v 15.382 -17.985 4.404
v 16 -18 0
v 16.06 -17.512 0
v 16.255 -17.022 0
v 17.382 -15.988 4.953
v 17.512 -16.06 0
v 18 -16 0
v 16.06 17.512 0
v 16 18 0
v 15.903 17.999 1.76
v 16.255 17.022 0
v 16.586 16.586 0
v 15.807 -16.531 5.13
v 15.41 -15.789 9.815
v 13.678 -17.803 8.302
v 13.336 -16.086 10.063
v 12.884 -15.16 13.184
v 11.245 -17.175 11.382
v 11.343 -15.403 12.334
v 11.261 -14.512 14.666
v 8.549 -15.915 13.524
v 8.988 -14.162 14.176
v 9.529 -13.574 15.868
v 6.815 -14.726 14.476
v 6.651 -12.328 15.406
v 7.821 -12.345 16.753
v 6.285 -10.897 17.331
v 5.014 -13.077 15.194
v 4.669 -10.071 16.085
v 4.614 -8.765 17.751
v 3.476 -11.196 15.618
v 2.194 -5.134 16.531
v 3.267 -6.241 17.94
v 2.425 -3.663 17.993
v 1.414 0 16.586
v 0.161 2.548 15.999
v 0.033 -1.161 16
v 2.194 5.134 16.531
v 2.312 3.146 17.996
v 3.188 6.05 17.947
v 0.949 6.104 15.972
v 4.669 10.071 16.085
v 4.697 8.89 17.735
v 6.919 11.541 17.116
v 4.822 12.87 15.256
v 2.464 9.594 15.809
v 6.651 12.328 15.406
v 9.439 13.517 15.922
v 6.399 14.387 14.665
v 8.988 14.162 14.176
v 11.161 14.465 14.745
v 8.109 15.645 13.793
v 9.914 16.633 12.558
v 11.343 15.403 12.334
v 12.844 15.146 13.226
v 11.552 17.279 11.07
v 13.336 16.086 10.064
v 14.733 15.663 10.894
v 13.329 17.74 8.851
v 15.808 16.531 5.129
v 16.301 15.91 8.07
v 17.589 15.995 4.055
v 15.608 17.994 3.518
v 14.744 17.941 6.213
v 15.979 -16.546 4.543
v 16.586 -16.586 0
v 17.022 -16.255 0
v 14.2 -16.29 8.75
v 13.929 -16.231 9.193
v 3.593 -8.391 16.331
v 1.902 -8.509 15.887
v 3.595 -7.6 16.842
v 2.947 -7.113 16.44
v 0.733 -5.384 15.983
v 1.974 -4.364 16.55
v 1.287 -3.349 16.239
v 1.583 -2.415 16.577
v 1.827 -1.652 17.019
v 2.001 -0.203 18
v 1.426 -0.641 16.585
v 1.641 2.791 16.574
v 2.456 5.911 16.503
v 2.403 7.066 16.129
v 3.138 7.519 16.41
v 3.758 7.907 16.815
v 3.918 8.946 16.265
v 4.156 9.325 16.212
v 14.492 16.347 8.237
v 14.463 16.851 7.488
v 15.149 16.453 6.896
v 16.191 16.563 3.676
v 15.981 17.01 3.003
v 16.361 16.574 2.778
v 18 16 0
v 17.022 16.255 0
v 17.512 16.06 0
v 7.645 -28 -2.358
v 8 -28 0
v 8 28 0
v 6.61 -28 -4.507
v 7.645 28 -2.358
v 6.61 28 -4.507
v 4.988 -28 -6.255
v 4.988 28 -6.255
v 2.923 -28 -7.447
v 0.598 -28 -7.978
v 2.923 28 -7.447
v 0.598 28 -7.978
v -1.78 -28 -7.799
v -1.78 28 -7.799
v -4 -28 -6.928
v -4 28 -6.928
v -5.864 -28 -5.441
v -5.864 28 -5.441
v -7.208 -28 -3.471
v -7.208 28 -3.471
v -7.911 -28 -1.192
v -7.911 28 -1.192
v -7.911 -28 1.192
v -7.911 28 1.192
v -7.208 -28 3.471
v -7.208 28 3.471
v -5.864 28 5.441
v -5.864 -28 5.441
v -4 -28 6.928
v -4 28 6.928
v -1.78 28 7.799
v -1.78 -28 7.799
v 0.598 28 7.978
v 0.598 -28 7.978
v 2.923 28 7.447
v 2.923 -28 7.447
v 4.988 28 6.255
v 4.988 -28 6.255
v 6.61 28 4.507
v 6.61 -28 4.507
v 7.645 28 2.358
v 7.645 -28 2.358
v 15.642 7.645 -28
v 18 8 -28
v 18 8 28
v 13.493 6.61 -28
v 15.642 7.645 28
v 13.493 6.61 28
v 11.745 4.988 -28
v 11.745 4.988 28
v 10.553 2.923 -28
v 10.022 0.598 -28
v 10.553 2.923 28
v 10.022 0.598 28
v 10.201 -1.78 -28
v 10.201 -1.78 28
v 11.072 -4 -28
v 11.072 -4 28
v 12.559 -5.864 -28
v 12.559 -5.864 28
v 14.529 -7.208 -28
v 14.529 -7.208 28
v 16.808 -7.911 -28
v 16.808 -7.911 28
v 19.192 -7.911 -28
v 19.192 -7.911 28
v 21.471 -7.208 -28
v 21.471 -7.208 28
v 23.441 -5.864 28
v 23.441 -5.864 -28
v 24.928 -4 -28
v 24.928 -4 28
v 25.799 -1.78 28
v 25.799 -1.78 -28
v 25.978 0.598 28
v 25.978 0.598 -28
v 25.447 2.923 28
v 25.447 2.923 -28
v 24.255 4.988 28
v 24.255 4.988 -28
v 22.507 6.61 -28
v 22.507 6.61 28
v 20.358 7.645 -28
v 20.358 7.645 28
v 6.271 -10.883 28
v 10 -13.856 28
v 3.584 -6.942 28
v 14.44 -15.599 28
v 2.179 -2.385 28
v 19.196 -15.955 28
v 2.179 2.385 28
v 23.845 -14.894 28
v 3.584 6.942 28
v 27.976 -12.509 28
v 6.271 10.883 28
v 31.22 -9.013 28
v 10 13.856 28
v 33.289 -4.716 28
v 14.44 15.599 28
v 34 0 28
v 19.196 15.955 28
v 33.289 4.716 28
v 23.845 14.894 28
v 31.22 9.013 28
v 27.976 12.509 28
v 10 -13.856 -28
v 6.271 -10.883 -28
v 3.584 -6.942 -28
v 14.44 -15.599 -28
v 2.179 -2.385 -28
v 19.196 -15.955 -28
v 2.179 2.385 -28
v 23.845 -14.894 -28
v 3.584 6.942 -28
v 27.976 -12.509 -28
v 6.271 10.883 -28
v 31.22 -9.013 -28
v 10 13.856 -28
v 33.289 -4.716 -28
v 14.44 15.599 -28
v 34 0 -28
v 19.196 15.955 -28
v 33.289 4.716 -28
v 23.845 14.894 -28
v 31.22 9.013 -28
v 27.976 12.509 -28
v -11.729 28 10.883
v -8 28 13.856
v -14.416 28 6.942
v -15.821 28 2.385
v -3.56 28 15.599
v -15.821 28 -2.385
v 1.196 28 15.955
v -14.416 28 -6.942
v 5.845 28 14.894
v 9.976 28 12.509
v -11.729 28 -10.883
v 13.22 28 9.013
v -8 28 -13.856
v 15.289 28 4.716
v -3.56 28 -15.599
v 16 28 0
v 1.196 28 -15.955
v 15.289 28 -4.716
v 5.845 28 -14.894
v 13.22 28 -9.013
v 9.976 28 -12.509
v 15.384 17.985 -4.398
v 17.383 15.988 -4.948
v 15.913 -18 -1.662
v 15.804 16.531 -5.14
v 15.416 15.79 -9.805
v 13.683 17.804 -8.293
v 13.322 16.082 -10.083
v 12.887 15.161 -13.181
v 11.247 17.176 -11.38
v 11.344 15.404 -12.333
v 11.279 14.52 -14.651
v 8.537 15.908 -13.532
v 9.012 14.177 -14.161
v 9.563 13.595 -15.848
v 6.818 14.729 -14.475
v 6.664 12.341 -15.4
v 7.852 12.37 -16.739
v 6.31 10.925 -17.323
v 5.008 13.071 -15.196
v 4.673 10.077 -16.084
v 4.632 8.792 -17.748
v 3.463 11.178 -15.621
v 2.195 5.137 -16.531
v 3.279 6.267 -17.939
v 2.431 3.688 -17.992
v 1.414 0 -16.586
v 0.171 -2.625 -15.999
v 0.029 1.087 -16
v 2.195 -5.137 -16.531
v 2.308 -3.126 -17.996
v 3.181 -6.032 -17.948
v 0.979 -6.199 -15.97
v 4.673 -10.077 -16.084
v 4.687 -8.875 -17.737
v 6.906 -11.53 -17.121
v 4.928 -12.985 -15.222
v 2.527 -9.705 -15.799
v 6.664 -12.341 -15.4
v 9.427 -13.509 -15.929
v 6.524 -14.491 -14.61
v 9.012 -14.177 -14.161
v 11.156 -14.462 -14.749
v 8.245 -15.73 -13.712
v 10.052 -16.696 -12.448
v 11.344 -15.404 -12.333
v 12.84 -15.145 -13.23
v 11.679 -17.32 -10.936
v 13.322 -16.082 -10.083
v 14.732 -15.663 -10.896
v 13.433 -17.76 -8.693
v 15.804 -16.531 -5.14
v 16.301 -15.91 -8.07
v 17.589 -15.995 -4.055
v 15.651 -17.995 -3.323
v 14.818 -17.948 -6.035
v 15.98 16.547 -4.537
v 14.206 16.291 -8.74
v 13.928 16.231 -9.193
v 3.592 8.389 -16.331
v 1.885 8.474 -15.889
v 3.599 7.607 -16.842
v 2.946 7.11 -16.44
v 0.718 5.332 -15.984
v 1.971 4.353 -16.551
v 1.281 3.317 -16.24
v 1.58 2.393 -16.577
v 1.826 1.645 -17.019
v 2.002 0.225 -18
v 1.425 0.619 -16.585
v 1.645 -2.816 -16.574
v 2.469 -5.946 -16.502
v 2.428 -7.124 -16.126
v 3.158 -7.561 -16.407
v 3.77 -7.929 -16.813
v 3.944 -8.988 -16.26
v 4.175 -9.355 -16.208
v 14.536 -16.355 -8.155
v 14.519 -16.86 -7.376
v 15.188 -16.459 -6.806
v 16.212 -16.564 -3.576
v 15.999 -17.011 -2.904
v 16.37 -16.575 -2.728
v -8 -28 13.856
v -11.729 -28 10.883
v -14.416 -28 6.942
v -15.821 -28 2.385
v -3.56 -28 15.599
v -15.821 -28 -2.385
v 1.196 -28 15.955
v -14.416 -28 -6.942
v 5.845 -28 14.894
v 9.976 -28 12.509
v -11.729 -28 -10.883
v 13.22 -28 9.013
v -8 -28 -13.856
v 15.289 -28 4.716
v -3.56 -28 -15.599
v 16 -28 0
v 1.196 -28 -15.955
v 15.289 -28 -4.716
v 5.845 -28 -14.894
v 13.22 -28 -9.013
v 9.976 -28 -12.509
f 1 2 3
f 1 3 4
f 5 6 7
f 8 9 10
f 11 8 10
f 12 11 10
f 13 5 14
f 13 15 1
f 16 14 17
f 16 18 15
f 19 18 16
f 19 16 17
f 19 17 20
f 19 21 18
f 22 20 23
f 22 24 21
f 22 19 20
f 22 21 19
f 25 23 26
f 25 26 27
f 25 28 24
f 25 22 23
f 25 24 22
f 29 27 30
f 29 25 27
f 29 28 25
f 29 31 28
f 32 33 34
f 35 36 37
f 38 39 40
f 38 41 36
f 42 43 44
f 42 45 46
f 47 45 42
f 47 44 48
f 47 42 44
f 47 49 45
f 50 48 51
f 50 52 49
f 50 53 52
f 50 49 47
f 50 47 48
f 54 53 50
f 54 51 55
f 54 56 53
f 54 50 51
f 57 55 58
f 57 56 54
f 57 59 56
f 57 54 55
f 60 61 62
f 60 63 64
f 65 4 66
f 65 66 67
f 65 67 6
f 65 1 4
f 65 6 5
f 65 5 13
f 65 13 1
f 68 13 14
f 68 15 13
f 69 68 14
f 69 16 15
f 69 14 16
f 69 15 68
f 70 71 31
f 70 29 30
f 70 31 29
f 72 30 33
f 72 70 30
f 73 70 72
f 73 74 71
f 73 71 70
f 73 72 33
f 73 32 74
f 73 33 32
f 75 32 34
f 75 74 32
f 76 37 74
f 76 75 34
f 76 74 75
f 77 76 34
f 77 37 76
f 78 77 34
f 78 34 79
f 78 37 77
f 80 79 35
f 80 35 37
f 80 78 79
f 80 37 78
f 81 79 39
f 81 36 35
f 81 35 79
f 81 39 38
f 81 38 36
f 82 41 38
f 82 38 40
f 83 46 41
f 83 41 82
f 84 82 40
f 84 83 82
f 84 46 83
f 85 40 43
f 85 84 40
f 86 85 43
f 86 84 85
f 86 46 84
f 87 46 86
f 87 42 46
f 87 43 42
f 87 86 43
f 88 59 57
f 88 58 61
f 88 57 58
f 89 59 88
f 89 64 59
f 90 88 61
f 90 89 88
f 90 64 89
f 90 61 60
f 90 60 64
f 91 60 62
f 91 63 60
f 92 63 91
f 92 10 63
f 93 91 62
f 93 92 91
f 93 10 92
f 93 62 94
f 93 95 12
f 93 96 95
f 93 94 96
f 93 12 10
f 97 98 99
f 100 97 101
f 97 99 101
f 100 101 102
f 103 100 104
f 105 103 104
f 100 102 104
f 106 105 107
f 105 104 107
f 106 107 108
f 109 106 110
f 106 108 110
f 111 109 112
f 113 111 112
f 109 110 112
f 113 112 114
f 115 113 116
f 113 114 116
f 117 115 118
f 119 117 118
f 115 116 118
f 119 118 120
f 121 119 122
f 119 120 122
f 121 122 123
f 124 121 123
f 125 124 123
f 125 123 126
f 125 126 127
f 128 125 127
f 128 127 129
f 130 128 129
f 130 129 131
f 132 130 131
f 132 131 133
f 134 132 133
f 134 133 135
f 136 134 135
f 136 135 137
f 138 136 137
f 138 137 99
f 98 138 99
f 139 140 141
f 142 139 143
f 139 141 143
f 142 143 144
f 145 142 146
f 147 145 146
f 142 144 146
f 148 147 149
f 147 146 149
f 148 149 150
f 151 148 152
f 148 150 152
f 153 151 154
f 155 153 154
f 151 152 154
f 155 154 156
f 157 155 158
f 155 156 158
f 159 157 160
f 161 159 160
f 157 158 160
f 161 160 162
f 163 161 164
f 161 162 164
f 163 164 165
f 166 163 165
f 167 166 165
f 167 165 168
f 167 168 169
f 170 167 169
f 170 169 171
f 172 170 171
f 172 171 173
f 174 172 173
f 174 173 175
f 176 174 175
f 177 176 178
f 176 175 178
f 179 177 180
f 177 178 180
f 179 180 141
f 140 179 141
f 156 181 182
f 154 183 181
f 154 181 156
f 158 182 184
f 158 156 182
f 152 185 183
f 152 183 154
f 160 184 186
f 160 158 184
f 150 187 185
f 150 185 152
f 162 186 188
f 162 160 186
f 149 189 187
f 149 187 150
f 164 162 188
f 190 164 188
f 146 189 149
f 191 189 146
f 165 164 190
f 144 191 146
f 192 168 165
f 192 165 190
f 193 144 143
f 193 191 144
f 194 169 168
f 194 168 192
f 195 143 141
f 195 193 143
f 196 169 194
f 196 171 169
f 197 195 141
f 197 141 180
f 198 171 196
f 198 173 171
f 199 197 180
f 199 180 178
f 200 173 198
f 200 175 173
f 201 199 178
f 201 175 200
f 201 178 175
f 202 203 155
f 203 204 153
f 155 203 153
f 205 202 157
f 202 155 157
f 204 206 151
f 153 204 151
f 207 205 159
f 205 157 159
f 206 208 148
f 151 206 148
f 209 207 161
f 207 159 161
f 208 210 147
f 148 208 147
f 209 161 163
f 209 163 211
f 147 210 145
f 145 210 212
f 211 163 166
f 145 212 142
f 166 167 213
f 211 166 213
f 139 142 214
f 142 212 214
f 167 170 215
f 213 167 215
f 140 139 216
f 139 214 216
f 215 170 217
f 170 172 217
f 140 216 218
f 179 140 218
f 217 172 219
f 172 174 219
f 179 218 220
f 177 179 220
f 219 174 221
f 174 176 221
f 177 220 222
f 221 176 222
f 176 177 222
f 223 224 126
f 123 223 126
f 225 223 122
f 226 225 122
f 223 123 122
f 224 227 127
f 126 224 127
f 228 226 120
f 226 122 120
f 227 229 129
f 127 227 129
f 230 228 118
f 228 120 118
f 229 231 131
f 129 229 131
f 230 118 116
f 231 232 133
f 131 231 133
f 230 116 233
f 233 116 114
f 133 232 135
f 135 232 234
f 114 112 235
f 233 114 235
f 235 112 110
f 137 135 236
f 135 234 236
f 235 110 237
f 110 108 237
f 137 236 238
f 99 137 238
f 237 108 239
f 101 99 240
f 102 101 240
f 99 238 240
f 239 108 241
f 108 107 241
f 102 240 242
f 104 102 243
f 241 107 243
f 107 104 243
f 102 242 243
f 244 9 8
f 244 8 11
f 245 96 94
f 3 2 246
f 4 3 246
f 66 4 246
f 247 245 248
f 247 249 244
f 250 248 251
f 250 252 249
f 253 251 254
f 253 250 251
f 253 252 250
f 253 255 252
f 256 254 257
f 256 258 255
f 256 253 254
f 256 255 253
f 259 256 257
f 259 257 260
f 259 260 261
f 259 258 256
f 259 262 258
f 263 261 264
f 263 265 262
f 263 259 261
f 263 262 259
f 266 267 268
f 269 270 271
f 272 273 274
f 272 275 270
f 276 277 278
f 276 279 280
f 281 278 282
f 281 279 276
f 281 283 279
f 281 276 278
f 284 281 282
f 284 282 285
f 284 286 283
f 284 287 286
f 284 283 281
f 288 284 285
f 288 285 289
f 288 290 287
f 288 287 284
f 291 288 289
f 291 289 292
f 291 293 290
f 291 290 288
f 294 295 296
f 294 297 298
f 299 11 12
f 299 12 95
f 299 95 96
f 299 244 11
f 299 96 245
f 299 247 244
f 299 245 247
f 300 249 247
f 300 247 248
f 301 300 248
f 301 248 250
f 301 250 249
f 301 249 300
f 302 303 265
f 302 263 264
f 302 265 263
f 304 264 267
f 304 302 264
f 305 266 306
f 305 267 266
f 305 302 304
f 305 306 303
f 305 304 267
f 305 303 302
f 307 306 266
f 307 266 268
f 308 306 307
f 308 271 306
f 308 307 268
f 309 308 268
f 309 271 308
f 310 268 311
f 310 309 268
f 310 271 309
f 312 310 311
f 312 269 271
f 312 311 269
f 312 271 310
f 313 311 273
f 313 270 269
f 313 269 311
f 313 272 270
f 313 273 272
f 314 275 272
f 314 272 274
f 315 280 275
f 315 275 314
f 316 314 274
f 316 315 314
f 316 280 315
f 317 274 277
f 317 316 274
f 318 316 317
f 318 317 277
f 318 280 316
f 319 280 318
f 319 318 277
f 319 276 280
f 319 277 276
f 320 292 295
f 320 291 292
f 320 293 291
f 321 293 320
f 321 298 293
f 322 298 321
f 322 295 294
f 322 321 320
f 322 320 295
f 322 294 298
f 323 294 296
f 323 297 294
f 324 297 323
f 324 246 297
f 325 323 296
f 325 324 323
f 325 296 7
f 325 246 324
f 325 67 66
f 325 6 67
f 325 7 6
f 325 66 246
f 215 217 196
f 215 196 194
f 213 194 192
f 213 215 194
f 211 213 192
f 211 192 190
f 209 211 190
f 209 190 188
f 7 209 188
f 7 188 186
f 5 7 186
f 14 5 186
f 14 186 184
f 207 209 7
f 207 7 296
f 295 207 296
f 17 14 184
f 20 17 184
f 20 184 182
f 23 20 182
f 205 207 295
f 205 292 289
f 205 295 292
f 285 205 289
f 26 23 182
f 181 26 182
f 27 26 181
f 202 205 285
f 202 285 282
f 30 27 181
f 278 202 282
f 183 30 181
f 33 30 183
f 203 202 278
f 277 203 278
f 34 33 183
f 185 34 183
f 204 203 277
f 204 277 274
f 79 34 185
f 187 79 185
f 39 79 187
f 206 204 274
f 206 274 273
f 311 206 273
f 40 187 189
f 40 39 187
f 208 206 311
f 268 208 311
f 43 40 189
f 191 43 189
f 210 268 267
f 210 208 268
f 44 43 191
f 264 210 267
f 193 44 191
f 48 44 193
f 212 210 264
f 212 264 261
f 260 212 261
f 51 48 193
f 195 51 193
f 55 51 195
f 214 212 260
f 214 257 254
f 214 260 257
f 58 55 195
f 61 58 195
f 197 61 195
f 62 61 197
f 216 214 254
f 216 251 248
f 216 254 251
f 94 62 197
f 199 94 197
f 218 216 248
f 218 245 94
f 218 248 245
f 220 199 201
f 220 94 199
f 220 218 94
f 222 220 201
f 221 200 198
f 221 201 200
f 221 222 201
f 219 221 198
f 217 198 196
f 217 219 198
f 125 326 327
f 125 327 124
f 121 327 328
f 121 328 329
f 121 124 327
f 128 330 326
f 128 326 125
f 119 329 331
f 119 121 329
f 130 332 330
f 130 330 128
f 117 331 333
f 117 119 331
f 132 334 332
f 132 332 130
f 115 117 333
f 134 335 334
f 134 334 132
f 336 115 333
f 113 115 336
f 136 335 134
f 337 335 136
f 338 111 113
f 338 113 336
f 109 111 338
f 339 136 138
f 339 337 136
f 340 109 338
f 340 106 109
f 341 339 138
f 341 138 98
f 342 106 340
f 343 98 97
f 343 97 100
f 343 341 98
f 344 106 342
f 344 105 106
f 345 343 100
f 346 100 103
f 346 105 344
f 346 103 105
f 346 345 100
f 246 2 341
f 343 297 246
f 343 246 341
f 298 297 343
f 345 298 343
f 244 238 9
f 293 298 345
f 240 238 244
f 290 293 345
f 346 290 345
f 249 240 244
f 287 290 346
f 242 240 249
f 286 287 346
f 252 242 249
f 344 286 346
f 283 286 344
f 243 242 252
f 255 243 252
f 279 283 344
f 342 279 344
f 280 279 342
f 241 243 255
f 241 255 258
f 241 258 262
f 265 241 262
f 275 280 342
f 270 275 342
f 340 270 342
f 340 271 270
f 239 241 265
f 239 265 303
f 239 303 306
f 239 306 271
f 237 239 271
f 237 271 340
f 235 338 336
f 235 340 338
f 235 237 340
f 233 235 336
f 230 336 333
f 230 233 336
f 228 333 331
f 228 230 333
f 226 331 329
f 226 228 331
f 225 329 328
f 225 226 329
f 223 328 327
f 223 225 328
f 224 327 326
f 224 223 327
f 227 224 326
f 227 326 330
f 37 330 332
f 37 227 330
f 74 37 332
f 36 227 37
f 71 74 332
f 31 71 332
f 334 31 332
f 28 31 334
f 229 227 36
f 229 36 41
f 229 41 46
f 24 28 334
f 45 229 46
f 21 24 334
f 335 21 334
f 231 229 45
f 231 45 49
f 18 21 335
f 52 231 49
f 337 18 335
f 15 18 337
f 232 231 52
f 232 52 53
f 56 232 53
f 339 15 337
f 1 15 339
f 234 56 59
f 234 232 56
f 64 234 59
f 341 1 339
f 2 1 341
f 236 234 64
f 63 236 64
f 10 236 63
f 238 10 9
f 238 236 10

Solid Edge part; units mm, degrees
sketch "Sketch1" plane through (0, 0, 0) normal (0, -1, 0) x (1, 0, 0)
  circle A0 centre (0, 0) radius 16
extrude "ExtrudedProtrusion_1" add sketch "Sketch1" along normal mid plane 56
sketch "Sketch2" plane through (0, 0, 0) normal (0, 0, 1) x (1, 0, 0)
  circle A0 centre (18, 0) radius 16
extrude "ExtrudedProtrusion_2" add sketch "Sketch2" along normal mid plane 56
sketch "Sketch3" plane through (0, 28, 0) normal (0, 1, 0) x (1, 0, 0)
  circle A0 centre (0, 0) radius 8
extrude "ExtrudedCutout_1" cut sketch "Sketch3" along normal mid plane 203.9389
sketch "Sketch4" plane through (18, 0, 28) normal (0, 0, 1) x (0, 1, 0)
  circle A0 centre (0, 0) radius 8
extrude "ExtrudedCutout_2" cut sketch "Sketch4" along normal mid plane 249.3799
fillet "Round_1" radius 2 1 edges at (9, -13.2288, 13.2288)
